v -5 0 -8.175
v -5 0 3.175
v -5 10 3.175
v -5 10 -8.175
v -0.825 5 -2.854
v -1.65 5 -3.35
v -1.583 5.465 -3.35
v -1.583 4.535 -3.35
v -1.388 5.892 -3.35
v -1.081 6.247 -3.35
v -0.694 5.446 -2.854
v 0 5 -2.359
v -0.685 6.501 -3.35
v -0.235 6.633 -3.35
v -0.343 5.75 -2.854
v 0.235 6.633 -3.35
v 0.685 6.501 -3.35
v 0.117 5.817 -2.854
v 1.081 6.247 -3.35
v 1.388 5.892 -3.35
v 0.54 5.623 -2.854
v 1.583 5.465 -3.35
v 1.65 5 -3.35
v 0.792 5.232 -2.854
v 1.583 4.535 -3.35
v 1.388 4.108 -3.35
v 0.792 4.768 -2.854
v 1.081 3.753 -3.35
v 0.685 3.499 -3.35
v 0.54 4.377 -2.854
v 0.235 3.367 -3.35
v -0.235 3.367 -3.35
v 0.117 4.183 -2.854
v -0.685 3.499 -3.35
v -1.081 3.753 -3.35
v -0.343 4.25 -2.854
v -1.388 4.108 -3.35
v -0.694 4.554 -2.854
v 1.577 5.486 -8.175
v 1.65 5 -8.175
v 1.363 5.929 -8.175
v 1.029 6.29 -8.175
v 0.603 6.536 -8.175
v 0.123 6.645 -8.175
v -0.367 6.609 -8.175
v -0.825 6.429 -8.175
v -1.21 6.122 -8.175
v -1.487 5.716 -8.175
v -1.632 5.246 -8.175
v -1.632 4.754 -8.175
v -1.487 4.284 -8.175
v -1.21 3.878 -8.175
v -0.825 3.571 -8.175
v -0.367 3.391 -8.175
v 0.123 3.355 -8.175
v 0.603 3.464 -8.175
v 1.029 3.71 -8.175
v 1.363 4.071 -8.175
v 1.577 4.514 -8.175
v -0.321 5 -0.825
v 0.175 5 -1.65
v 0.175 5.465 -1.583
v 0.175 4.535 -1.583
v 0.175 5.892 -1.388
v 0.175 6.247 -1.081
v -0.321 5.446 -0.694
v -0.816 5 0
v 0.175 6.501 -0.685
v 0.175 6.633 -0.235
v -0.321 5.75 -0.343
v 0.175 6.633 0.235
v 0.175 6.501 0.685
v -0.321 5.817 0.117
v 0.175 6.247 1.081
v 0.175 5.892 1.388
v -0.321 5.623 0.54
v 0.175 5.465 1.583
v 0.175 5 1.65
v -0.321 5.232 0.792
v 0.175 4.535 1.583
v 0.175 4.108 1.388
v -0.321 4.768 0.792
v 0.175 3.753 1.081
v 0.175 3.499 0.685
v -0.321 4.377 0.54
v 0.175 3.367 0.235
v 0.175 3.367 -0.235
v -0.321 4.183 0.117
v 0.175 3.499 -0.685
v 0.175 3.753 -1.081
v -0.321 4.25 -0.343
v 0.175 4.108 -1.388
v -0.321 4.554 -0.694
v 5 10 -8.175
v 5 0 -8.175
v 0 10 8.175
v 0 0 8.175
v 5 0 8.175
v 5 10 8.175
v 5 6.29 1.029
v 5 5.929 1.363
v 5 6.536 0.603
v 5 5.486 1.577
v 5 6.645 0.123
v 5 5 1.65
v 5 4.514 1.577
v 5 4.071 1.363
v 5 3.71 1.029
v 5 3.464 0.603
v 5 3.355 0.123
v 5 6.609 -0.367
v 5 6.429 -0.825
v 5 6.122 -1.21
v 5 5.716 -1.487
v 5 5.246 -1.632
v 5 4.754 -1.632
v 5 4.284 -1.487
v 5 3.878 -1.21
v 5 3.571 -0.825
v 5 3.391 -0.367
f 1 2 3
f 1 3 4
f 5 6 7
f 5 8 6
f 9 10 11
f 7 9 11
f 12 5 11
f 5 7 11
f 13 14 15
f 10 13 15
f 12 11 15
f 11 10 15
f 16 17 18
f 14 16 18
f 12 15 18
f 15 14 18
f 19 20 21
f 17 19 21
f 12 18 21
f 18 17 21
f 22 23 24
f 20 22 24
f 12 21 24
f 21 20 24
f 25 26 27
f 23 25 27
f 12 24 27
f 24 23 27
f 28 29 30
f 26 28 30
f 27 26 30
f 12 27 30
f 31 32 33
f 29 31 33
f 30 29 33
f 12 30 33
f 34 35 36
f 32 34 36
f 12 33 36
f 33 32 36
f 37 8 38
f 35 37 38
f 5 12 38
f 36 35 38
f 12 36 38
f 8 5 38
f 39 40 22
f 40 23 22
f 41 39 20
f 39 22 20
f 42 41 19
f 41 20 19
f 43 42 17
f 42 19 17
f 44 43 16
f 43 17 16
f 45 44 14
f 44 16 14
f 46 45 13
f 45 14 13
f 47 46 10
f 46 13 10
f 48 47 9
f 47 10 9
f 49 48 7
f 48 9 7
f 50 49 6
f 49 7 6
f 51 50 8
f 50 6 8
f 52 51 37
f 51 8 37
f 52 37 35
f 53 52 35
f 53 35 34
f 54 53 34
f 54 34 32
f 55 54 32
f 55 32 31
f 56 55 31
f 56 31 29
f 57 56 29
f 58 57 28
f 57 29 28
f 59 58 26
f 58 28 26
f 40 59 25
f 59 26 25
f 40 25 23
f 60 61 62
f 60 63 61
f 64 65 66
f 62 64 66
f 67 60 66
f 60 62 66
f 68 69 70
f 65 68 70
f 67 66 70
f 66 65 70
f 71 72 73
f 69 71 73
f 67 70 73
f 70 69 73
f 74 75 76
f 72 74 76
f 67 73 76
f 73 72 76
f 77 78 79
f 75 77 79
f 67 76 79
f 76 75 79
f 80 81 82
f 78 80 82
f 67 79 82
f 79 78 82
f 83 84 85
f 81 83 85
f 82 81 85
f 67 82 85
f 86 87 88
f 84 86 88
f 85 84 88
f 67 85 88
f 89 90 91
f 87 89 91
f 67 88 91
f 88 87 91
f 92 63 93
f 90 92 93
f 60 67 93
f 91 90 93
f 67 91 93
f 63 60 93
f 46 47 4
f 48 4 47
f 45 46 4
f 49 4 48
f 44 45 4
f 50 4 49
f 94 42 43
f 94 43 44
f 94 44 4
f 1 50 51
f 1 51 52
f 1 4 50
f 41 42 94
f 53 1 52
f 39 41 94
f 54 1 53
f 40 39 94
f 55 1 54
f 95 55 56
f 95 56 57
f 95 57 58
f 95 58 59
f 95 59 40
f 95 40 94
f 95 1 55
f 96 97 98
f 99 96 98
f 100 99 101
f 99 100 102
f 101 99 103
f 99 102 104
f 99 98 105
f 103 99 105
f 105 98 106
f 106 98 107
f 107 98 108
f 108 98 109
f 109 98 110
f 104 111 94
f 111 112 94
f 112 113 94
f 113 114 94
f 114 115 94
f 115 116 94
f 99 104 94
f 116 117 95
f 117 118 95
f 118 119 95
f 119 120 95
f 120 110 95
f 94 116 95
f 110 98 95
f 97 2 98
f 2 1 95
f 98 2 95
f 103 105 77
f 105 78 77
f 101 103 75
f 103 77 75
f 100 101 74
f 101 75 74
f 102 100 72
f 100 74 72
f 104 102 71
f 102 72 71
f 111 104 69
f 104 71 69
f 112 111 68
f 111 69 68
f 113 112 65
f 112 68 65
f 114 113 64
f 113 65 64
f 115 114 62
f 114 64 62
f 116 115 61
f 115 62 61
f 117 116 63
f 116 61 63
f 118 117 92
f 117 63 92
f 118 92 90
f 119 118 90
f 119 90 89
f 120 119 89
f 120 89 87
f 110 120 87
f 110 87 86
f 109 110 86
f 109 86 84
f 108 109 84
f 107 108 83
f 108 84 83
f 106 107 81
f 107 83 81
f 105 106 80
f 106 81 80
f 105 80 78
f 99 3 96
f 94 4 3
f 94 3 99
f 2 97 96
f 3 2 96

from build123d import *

# Parameters (mm, degrees)
SKETCH1_W                 = 10
SKETCH1_H                 = 16.35
BOSS_EXTRUDE1_DEPTH       = 10
CHAMFER1_SIZE             = 5
M4X0_7_TAPPED_HOLE1_D     = 3.3
M4X0_7_TAPPED_HOLE1_DEPTH = 4.825
M4X0_7_TAPPED_HOLE1_TIP   = 0.991420021
M4X0_7_TAPPED_HOLE2_D     = 3.3
M4X0_7_TAPPED_HOLE2_DEPTH = 4.825
M4X0_7_TAPPED_HOLE2_TIP   = 0.991420021


with BuildPart() as part:
    # Sketch1 → Boss-Extrude1 (new body)
    with BuildSketch(Plane(origin=(0, 0, 0), x_dir=(1, 0, 0), z_dir=(0, 1, 0))):
        Rectangle(SKETCH1_W, SKETCH1_H)
    extrude(amount=BOSS_EXTRUDE1_DEPTH)

    # Chamfer1
    chamfer1_edges = [part.edges().sort_by_distance(p)[0] for p in [
        (-5, 5, 8.175),
    ]]
    chamfer(chamfer1_edges, length=CHAMFER1_SIZE)

    # M4x0.7 Tapped Hole1
    with Locations(Plane(origin=(5, 0, 0), x_dir=(0, 0, -1), z_dir=(1, 0, 0))):
        with Locations((0, 5)):
            Hole(M4X0_7_TAPPED_HOLE1_D / 2, depth=M4X0_7_TAPPED_HOLE1_DEPTH)
            with Locations((0, 0, -(M4X0_7_TAPPED_HOLE1_DEPTH + M4X0_7_TAPPED_HOLE1_TIP / 2))):  # 118° drill point
                Cone(0, M4X0_7_TAPPED_HOLE1_D / 2, M4X0_7_TAPPED_HOLE1_TIP, mode=Mode.SUBTRACT)

    # M4x0.7 Tapped Hole2
    with Locations(Plane(origin=(0, 0, -8.175), x_dir=(-1, 0, 0), z_dir=(0, 0, -1))):
        with Locations((0, 5)):
            Hole(M4X0_7_TAPPED_HOLE2_D / 2, depth=M4X0_7_TAPPED_HOLE2_DEPTH)
            with Locations((0, 0, -(M4X0_7_TAPPED_HOLE2_DEPTH + M4X0_7_TAPPED_HOLE2_TIP / 2))):  # 118° drill point
                Cone(0, M4X0_7_TAPPED_HOLE2_D / 2, M4X0_7_TAPPED_HOLE2_TIP, mode=Mode.SUBTRACT)


solid = part.part
